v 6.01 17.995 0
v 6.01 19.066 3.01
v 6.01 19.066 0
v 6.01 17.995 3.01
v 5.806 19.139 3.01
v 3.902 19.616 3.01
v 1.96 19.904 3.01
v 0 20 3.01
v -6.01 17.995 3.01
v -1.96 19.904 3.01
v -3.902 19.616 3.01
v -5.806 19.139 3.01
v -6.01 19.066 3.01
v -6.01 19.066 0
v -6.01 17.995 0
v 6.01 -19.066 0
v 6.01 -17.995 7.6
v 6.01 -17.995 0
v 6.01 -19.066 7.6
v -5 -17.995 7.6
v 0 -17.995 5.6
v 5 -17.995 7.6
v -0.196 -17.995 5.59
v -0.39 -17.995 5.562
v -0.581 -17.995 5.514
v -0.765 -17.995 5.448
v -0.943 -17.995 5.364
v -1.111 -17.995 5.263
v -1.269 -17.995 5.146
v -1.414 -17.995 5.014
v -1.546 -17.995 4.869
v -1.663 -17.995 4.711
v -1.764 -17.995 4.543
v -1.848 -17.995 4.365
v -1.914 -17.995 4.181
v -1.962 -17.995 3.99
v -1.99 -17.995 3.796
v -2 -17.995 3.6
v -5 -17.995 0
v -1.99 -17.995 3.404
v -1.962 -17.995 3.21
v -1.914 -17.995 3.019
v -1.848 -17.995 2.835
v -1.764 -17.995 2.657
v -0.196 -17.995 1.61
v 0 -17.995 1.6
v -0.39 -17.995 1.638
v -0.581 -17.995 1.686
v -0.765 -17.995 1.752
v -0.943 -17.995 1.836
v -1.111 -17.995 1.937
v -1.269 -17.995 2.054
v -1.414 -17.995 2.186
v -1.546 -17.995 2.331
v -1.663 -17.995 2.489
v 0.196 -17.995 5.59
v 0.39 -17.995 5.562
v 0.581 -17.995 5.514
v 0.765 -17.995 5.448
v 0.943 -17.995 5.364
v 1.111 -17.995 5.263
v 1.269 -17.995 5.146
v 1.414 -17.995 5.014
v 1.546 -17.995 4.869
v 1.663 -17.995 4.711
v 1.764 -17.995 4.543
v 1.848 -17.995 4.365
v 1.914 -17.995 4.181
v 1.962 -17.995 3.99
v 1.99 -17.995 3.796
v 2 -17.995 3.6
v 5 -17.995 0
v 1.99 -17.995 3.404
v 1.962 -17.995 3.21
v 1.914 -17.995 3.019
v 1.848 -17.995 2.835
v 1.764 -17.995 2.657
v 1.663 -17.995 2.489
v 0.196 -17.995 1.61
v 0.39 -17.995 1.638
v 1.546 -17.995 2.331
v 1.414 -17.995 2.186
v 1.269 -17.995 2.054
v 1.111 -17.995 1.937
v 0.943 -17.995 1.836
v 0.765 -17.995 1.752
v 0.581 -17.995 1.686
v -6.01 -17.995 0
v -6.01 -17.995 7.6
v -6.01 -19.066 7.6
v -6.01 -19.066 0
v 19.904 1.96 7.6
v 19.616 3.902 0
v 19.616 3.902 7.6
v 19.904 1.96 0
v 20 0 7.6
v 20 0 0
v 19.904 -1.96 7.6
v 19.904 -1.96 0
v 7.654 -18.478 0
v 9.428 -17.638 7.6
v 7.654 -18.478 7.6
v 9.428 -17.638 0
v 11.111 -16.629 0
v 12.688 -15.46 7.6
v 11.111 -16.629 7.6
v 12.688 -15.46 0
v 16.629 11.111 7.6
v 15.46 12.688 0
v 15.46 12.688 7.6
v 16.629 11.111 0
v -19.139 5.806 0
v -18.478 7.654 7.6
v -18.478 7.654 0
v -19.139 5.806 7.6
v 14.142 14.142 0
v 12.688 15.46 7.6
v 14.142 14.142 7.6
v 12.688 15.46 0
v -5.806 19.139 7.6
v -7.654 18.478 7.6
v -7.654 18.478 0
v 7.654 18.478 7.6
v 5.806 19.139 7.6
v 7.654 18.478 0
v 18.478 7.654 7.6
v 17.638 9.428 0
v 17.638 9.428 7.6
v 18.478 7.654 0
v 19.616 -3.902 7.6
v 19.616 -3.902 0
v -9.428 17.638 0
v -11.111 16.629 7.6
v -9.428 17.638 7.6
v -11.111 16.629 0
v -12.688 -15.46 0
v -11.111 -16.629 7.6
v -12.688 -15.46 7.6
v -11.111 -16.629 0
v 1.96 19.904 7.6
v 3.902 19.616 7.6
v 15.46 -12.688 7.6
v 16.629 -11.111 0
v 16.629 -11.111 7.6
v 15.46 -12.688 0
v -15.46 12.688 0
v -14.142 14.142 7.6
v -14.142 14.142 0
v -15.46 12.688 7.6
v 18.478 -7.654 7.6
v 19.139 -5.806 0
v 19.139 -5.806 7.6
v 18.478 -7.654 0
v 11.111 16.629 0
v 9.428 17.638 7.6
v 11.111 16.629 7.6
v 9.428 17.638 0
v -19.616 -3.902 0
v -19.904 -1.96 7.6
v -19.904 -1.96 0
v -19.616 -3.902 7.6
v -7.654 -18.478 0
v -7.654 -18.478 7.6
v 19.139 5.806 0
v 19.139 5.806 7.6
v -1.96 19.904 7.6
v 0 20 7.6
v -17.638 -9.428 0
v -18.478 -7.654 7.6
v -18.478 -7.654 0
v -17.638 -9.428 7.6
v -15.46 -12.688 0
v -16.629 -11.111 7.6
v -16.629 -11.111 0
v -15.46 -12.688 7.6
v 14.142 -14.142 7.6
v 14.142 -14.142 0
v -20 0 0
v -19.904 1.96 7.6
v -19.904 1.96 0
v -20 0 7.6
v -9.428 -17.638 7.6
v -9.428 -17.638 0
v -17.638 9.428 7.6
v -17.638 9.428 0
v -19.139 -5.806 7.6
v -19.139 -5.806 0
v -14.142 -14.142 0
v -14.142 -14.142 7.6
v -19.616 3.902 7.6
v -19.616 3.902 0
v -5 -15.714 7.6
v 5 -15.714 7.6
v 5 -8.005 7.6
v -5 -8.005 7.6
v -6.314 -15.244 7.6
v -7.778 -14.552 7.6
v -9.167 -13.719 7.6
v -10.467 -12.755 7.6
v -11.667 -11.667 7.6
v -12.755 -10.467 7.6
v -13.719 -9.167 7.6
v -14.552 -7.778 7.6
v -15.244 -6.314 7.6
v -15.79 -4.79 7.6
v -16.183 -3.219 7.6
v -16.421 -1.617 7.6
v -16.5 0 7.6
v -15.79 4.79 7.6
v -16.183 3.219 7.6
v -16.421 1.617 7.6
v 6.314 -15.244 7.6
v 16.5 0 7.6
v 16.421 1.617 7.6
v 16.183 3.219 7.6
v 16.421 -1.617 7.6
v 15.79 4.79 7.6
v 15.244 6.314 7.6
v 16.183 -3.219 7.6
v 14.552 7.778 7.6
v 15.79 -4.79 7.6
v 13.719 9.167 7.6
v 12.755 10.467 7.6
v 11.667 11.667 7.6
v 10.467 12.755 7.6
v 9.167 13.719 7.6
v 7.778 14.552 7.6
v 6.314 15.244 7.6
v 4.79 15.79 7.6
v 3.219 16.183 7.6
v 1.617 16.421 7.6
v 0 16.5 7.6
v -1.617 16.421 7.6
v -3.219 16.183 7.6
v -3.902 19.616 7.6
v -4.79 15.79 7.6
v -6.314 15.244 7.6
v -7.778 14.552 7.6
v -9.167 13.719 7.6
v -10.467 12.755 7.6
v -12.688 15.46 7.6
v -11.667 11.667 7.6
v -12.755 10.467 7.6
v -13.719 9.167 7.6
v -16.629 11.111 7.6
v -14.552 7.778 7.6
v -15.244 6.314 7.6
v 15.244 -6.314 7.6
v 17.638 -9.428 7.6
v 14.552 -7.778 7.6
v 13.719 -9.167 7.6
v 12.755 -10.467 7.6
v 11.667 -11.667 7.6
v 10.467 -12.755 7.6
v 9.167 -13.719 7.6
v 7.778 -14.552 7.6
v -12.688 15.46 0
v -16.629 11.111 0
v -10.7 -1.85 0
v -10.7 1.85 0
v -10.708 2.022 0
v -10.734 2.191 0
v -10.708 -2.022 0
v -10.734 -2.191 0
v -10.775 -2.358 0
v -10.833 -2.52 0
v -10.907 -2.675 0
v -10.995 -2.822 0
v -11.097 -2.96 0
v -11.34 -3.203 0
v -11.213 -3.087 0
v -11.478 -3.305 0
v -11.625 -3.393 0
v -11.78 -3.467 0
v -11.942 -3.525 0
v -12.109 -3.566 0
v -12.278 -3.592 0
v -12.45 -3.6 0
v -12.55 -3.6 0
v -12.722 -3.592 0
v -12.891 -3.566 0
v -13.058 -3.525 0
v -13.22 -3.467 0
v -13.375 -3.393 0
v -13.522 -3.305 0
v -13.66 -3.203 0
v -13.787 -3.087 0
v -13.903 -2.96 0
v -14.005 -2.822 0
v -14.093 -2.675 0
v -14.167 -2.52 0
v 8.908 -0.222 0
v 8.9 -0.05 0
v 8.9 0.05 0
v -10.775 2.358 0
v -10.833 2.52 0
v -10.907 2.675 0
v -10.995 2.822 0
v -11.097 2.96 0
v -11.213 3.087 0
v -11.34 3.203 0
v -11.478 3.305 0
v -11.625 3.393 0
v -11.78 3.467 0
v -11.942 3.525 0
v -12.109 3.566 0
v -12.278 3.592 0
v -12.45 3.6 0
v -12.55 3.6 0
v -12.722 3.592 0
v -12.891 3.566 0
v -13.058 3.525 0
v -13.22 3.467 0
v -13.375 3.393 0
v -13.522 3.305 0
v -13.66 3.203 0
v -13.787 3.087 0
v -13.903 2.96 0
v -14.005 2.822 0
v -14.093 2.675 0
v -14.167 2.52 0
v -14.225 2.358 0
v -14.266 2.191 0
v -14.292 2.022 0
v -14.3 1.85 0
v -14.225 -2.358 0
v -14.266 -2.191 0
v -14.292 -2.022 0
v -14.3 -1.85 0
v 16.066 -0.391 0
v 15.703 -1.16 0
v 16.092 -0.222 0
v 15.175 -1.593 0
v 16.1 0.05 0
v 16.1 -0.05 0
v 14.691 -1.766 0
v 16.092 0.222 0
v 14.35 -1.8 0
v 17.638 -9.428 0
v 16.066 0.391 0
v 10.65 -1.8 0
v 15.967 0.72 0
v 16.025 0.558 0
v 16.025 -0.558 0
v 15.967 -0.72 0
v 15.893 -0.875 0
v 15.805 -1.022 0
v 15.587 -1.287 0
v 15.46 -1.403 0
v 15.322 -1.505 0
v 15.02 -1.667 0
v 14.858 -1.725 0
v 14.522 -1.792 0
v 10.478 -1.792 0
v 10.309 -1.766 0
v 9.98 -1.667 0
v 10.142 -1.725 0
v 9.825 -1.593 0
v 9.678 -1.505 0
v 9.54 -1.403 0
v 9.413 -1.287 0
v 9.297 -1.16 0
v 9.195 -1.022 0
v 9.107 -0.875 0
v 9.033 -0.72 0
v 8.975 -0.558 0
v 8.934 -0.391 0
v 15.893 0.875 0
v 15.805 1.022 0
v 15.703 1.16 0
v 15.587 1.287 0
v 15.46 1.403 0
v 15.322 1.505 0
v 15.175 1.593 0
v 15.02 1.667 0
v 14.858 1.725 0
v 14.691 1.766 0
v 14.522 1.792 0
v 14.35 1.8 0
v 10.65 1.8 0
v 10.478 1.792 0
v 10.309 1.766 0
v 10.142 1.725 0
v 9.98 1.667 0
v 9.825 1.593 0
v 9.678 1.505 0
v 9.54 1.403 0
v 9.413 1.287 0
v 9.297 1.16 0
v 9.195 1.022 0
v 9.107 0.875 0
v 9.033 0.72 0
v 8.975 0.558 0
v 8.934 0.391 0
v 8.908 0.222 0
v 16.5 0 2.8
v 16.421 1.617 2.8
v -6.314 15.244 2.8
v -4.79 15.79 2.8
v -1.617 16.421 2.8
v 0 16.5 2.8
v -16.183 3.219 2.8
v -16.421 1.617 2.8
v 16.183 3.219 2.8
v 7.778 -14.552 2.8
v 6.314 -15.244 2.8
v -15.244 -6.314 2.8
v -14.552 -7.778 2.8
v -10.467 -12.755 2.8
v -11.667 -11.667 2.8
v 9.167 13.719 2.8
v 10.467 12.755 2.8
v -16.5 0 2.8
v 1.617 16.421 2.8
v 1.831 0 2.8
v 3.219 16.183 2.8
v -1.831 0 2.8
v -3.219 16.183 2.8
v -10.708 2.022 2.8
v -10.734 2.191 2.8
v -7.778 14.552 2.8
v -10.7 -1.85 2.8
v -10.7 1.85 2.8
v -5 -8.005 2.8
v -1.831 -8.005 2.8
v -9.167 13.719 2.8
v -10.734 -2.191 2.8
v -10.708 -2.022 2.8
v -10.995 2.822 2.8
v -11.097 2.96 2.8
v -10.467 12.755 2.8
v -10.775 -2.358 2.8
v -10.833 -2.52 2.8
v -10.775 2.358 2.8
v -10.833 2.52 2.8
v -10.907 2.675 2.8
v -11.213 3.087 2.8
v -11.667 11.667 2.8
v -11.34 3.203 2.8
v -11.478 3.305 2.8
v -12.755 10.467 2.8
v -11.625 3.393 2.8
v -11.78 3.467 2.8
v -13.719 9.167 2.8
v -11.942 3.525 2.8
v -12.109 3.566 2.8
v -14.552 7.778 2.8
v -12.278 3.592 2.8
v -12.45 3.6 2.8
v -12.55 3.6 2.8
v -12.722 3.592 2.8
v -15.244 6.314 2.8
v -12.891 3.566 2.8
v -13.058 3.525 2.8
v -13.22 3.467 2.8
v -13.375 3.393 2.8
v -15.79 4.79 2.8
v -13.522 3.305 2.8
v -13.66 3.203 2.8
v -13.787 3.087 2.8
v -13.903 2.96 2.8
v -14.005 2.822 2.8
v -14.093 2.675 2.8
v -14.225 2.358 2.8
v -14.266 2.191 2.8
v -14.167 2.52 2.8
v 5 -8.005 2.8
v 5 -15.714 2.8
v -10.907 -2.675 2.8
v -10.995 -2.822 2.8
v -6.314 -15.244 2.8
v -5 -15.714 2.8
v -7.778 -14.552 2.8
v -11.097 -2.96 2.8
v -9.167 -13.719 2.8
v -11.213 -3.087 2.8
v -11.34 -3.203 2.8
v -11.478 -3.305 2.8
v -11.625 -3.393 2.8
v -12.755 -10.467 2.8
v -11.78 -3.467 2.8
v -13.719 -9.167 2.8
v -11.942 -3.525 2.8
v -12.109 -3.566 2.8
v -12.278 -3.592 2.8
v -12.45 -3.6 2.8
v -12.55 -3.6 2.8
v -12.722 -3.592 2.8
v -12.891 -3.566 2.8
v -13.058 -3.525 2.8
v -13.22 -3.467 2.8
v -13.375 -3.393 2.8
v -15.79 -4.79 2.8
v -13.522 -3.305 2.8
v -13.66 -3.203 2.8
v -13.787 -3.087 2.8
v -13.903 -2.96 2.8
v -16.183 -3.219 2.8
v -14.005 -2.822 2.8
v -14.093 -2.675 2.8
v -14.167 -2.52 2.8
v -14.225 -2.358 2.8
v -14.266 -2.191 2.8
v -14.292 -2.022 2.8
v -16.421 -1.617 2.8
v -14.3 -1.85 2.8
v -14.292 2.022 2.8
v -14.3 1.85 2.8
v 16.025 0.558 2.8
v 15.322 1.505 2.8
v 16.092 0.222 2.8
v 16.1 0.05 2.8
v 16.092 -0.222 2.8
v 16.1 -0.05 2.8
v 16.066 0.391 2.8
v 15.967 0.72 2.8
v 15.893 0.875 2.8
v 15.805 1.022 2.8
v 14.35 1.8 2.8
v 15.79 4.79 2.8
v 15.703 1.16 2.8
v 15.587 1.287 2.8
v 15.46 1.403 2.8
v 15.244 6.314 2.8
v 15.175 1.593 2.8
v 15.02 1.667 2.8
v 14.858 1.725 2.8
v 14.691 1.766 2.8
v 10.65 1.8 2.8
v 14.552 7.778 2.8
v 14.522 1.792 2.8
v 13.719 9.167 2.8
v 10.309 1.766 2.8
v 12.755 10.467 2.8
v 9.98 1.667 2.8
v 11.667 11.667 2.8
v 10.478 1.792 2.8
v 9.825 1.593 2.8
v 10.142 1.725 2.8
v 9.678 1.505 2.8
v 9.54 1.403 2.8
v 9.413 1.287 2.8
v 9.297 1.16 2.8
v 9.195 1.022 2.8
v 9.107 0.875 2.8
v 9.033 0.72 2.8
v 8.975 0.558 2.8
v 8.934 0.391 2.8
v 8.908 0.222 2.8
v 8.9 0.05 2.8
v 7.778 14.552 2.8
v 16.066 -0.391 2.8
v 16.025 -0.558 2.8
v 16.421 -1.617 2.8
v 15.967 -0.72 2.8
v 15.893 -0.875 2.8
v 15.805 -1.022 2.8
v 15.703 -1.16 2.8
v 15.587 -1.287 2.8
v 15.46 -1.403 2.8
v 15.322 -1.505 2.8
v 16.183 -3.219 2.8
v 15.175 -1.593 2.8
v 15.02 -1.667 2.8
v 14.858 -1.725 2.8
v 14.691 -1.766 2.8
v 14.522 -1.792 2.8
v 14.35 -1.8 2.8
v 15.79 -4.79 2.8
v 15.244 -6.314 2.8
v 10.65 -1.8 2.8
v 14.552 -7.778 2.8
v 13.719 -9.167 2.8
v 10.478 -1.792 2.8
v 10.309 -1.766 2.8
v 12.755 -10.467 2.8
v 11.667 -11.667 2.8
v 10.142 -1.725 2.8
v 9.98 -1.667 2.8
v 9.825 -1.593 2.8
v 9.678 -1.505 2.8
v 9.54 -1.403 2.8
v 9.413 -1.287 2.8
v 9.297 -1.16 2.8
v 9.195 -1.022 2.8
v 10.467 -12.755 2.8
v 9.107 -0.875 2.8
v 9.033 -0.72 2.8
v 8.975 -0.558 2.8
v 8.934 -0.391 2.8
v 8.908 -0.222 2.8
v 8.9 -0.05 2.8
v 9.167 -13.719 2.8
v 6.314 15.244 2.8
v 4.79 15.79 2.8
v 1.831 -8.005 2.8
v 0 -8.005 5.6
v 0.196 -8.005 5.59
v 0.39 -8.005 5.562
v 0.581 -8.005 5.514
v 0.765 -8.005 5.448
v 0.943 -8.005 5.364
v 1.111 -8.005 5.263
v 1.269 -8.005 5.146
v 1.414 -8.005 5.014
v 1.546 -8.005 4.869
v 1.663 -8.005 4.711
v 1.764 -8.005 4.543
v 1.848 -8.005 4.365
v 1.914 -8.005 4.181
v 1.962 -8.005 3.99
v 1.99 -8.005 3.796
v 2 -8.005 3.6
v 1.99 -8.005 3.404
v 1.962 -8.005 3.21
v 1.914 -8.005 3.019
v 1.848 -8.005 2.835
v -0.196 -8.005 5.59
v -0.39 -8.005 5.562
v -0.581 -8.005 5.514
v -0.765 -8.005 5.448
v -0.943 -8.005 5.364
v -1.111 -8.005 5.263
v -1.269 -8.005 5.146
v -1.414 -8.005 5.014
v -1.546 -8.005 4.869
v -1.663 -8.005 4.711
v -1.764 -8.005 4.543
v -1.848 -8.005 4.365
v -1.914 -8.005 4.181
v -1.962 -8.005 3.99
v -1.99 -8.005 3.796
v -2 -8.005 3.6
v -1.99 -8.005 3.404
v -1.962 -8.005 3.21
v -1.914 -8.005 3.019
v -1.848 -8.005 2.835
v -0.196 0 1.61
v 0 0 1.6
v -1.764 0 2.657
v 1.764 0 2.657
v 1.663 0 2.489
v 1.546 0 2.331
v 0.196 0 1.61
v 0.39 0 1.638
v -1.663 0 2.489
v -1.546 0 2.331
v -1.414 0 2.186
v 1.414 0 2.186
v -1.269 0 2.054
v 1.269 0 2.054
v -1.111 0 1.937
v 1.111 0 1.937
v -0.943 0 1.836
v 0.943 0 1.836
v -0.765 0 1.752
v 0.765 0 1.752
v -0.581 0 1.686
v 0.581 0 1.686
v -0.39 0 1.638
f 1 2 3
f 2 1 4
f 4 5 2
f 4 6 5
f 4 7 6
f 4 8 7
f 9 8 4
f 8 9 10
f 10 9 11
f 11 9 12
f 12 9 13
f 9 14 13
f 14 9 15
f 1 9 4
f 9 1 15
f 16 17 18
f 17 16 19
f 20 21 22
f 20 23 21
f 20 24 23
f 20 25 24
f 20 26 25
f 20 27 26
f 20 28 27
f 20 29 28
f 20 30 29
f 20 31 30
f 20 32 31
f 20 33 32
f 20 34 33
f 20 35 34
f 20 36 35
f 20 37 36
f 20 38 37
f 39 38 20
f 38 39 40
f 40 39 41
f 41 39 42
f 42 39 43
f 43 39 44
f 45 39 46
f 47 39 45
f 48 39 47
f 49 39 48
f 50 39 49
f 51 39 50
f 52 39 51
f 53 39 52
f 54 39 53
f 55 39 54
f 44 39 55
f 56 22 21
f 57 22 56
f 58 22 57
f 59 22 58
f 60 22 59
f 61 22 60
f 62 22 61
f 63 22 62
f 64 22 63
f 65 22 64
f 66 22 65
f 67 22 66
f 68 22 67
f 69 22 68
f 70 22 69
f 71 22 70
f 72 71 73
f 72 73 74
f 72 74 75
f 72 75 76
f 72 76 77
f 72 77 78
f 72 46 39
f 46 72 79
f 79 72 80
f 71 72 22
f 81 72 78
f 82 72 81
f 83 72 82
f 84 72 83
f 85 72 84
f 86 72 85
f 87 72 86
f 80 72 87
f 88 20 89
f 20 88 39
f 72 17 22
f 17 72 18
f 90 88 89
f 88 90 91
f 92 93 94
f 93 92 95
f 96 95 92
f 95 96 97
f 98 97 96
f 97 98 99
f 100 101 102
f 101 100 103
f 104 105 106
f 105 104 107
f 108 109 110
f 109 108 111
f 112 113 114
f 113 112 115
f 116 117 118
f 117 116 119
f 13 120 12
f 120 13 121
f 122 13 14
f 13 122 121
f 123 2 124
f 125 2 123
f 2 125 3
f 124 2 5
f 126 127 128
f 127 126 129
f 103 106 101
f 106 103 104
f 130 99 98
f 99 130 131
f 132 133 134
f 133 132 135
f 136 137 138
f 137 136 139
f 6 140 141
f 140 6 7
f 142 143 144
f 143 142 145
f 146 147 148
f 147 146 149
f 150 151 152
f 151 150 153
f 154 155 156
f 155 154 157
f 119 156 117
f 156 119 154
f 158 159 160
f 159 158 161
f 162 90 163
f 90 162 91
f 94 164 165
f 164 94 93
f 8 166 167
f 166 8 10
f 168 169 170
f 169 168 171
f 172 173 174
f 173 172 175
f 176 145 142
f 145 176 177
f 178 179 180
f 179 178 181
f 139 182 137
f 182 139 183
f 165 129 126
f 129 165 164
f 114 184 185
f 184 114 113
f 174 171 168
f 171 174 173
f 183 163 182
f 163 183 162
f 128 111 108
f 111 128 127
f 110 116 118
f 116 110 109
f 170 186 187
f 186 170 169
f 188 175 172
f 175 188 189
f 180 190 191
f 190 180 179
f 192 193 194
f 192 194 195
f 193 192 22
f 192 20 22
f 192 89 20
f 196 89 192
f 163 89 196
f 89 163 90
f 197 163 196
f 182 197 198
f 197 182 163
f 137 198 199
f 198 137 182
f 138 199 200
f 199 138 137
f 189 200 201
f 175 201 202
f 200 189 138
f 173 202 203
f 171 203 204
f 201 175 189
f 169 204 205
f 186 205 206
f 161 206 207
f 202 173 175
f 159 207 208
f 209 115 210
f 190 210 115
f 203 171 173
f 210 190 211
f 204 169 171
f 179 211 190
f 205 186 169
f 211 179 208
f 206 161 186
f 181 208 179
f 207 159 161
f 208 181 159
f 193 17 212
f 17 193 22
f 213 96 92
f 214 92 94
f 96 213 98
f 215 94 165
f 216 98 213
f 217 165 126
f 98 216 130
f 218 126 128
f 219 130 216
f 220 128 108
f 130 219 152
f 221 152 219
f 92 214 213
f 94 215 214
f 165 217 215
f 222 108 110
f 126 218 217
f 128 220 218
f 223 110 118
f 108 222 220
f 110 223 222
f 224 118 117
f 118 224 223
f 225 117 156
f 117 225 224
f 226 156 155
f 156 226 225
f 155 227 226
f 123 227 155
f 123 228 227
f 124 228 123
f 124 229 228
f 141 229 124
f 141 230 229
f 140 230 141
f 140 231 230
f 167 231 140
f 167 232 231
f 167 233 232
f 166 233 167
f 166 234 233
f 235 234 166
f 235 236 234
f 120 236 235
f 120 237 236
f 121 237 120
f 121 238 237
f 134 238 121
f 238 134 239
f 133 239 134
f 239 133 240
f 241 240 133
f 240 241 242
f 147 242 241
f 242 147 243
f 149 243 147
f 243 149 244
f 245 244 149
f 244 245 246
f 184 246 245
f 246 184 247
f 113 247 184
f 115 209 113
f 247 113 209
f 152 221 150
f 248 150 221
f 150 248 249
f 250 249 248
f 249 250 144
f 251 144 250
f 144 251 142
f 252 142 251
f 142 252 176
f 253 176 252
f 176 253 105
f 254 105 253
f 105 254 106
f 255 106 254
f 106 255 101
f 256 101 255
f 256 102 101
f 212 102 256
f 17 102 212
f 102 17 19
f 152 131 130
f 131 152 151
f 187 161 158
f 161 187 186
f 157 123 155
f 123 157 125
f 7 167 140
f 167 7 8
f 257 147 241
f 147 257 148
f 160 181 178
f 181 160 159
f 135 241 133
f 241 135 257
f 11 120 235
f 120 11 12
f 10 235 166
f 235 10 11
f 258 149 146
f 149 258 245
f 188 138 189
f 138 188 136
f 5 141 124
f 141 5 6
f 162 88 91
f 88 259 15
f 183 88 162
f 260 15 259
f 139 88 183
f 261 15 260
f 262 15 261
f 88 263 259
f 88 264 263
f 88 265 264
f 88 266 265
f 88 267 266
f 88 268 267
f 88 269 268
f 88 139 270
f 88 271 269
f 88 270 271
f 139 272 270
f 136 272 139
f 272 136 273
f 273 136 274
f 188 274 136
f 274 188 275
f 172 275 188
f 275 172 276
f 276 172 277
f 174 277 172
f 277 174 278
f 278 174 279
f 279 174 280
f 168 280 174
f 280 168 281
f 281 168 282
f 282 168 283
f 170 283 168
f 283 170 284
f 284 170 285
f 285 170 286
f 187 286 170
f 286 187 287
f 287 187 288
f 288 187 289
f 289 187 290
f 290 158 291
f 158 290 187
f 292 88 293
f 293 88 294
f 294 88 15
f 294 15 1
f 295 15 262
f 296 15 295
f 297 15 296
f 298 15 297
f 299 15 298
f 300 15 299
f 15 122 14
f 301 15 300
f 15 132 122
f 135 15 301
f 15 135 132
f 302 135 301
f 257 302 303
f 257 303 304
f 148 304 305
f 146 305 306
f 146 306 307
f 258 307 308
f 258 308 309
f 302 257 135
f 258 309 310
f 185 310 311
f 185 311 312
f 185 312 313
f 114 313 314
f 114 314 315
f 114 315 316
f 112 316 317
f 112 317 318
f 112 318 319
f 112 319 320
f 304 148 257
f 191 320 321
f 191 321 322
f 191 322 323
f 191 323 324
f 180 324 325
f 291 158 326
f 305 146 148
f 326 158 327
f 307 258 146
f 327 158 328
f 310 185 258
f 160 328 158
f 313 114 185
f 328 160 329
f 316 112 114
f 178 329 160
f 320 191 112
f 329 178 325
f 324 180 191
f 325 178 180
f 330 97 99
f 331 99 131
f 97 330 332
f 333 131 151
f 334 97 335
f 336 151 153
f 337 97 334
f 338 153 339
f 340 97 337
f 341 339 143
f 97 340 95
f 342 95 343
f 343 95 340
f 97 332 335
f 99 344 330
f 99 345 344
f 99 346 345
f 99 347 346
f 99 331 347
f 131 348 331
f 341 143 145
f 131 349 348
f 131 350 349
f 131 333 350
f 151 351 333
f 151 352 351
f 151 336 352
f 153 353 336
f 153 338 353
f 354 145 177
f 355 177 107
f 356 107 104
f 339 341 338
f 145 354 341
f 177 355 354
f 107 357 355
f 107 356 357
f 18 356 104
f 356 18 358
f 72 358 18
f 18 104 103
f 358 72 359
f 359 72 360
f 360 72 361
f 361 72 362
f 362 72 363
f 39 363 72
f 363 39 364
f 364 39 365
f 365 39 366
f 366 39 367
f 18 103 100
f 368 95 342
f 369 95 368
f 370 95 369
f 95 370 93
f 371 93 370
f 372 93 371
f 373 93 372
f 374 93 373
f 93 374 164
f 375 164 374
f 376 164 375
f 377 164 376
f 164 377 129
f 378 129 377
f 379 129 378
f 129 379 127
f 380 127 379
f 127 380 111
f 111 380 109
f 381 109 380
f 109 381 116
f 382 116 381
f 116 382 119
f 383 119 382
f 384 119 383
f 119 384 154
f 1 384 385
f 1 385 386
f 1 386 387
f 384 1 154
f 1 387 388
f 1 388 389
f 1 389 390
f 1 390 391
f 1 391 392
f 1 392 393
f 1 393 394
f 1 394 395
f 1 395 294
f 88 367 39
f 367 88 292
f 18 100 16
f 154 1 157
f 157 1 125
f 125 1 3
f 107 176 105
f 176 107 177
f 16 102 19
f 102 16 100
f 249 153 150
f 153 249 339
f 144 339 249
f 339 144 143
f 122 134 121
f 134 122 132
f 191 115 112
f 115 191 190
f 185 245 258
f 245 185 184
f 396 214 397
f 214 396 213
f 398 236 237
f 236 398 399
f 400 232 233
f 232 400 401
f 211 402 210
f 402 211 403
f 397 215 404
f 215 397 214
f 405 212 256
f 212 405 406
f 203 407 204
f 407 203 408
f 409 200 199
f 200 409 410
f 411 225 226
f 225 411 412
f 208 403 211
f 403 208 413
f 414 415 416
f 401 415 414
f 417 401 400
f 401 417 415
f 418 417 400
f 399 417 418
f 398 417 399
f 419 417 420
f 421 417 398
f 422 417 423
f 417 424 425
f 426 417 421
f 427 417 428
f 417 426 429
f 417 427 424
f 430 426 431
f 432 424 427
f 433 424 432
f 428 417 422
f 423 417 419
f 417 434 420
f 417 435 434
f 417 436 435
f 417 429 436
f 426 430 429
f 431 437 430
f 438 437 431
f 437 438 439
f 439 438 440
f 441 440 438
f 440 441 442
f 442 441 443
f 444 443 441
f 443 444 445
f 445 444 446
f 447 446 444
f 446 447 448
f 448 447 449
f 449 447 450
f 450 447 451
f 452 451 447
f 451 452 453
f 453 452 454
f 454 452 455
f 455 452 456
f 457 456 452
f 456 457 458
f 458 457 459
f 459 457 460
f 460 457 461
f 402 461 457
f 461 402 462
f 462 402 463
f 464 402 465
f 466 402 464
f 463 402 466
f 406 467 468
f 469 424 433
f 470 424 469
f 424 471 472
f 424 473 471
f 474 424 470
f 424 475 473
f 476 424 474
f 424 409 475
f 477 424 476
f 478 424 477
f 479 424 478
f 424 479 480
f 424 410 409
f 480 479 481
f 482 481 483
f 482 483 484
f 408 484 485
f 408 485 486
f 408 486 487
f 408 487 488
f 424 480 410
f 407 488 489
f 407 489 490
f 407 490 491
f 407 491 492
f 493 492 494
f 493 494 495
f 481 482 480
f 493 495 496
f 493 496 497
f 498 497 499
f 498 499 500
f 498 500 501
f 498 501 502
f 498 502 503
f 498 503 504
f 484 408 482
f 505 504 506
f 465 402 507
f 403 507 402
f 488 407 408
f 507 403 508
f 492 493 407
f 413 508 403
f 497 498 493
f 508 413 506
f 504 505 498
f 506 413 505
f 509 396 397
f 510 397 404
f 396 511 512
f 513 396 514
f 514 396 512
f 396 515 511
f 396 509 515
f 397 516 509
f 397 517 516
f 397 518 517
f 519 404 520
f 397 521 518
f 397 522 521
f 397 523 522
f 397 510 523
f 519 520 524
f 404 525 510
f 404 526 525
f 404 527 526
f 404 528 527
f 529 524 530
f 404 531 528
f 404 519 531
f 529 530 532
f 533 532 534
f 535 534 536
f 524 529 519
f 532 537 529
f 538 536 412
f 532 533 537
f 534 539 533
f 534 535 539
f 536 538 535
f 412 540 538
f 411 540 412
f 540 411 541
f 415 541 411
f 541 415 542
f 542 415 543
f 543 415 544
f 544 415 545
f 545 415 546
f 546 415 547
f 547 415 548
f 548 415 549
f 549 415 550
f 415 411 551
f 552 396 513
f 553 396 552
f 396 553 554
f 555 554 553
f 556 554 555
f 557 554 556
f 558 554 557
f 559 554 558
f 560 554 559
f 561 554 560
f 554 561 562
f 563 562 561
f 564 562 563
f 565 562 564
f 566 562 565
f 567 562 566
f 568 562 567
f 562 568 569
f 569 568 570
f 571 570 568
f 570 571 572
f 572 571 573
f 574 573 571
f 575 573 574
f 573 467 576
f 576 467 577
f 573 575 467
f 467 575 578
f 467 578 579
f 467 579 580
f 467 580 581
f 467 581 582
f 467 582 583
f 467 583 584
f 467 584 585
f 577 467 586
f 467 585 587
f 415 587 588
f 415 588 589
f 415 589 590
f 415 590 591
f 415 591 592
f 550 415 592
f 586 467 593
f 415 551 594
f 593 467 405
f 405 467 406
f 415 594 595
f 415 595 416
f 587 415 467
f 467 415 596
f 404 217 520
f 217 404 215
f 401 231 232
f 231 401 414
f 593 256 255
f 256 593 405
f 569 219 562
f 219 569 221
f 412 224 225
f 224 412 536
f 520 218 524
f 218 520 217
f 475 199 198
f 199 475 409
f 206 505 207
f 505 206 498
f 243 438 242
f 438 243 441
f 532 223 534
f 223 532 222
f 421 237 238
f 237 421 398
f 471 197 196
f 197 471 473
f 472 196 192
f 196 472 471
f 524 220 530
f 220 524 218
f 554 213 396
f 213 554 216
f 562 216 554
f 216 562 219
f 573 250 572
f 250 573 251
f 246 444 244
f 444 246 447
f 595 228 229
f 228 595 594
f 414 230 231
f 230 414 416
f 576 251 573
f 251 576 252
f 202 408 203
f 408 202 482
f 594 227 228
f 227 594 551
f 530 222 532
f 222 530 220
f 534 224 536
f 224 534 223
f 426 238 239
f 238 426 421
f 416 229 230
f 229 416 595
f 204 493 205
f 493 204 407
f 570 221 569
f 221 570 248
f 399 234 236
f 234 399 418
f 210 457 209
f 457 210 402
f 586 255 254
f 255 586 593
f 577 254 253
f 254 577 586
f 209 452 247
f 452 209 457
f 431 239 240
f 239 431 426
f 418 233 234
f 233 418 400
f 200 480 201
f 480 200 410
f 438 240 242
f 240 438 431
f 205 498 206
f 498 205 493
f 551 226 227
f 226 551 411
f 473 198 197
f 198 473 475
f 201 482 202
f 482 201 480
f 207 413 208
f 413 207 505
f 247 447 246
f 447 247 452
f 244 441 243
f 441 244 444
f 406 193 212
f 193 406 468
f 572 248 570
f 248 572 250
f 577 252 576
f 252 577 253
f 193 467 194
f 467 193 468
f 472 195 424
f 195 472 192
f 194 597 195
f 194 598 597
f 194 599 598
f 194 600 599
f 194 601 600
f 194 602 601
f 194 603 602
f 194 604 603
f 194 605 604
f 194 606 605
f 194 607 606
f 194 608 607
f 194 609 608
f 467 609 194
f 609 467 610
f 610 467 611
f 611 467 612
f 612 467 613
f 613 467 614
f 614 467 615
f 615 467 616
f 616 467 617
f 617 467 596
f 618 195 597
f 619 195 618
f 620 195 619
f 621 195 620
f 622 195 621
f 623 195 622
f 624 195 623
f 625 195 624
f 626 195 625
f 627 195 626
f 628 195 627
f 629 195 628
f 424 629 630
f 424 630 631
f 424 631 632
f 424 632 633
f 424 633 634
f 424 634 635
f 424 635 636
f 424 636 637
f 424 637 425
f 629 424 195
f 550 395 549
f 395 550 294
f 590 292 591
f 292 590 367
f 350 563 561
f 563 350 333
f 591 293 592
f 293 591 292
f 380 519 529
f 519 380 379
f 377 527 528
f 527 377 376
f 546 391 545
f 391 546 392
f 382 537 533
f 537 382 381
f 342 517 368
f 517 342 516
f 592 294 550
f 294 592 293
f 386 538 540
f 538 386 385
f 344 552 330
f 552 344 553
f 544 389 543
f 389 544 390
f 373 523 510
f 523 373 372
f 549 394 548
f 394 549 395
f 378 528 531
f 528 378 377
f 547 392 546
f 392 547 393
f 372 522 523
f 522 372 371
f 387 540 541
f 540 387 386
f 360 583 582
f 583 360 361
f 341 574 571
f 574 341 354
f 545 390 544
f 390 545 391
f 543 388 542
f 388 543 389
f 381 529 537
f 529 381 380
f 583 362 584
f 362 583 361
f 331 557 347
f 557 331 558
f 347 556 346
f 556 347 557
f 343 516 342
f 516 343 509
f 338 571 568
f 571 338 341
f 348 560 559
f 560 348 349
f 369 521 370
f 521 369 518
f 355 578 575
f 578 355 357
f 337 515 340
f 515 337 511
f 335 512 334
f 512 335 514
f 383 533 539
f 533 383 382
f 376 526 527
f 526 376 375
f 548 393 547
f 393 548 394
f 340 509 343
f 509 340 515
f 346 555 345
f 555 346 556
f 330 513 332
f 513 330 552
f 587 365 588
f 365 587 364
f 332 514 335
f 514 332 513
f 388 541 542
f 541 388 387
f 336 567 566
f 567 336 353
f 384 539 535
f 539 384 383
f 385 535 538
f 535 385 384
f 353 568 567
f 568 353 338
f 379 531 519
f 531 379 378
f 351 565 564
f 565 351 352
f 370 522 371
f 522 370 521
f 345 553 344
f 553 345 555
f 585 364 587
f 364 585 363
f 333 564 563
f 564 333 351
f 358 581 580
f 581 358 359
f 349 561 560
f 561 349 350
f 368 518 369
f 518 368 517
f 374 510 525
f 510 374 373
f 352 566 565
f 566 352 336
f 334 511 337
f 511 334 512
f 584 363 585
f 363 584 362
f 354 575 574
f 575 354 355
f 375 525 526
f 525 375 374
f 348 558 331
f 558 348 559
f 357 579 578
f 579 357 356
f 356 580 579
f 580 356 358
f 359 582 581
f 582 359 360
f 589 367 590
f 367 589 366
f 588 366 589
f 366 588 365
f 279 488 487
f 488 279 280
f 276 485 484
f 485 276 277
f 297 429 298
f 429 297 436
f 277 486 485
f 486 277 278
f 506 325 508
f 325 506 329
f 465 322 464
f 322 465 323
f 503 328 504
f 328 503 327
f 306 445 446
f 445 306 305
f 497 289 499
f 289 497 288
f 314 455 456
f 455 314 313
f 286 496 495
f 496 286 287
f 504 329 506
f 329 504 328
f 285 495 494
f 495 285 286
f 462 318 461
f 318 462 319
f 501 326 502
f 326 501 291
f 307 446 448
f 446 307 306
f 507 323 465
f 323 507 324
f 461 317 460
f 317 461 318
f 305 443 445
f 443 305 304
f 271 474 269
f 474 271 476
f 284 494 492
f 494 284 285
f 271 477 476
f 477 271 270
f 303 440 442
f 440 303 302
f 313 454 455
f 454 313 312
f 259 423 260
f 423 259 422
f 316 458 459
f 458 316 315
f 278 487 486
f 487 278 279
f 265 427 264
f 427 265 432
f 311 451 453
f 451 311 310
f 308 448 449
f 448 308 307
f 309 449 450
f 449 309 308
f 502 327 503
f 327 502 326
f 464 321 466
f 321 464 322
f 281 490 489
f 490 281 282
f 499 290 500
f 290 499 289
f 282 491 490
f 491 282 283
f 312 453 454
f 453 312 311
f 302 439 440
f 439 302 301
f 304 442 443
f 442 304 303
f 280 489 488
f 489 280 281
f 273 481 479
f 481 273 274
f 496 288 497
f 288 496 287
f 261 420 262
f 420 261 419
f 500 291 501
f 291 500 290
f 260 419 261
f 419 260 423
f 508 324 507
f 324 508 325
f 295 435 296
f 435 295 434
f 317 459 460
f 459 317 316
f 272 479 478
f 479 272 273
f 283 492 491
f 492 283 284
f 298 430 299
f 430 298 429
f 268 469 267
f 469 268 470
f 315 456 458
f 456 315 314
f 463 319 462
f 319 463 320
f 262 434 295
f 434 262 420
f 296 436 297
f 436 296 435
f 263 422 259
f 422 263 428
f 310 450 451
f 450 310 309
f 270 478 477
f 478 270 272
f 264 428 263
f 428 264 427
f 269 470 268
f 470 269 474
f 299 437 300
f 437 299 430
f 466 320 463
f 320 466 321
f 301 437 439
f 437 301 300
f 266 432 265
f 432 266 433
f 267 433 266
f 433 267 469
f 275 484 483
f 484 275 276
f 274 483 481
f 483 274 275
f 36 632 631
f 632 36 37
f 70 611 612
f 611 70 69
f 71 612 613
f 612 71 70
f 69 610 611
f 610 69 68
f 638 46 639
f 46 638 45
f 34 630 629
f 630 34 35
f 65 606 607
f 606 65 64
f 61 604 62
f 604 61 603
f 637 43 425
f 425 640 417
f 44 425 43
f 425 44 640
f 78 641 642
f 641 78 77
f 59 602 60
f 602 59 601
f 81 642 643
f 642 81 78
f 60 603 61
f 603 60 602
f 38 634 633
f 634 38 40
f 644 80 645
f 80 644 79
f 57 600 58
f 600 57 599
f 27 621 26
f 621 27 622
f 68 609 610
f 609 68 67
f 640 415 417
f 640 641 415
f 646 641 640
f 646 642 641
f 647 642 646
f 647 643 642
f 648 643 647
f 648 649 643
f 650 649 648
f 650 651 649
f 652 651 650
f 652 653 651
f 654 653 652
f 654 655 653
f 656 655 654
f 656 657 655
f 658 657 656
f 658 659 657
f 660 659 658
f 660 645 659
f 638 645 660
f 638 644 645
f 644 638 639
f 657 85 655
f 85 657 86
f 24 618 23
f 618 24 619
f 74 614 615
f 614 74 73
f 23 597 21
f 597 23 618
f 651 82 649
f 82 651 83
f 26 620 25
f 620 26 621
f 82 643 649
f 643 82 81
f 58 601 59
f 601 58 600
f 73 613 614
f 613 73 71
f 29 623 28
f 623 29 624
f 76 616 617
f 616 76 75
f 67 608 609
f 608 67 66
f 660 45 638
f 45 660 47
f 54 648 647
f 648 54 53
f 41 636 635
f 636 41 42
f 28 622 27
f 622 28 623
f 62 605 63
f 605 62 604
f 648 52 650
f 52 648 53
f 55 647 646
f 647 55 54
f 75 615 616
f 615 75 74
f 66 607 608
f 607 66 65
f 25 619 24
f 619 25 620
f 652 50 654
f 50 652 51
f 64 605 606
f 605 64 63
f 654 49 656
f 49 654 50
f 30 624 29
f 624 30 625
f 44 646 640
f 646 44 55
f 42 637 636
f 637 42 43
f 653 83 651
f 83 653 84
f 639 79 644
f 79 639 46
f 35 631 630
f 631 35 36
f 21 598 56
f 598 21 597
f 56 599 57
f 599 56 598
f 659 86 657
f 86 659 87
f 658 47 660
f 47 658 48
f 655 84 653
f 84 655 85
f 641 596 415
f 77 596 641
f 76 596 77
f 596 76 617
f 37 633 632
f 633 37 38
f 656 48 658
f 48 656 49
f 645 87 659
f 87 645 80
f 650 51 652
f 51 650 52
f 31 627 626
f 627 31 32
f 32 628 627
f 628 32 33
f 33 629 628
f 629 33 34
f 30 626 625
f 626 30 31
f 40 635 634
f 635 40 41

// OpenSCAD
// file: bathroomHolderCircle/tab_perpendicular_peg_cutout.scad
// Radial cylinder through tab-recess rim (axis ⊥ XZ back wall of tab_recess_pocket).
// Geometry parameters match the tab pocket on the outer wall (see tab_recess_cutout.scad).

module tab_perpendicular_peg_cutout() {
    base_outer_r = 40 / 2;
    tab_recess_depth = 2;
    tab_perpendicular_peg_d = 4;
    tab_perpendicular_peg_z = 2 + 1.6;
    tab_perpendicular_peg_length = 18;
    y_offset = 10;

    y_center = -1 * (base_outer_r - tab_recess_depth / 2);
    translate([0, y_center + y_offset, tab_perpendicular_peg_z])
        rotate([90, 0, 0])
            cylinder(h = tab_perpendicular_peg_length, d = tab_perpendicular_peg_d, center = true);
}
// file: bathroomHolderCircle/tab_recess_cutout.scad
// "Вырез под выступ": symmetric pockets on the outer wall at +Y and −Y (perpendicular to the pin line on ±X).
// Tangent width 12 mm, radial depth 2 mm; axial extent for each pocket is set separately (from z = 0 upward).

base_outer_r = 40 / 2;
tab_recess_width = 12;
tab_recess_depth = 2;
base_height = 6.6;

// Axial height (mm) of each pocket from z = 0; set independently for +Y and −Y sides.
tab_recess_z_plus_y = 6.6 - 3.6;
tab_recess_z_minus_y = 7.6;

// Single pocket: yaw_deg = 0 → +Y rim; yaw_deg = 180 → −Y rim.
module tab_recess_pocket(z_height, yaw_deg) {
    eps = 0.01;
    rotate([0, 0, yaw_deg])
        translate([0, base_outer_r - tab_recess_depth / 2 + eps / 2, z_height / 2])
            cube([tab_recess_width + 2 * eps, tab_recess_depth + 2 * eps, z_height + 2 * eps], center = true);
}

module tab_recess_cutout() {
    tab_recess_pocket(tab_recess_z_plus_y, 0);
    tab_recess_pocket(tab_recess_z_minus_y, 180);
}
// file: bathroomHolderCircle/pin_cutouts.scad
// Pin holes: rounded-rectangle profile in plan (flat sides, arcs only in corners — not ellipse-like).
// Axis along Z (normal to the flat lid). Centers symmetric on ±X at pin_offset_from_axis.

pin_plan_w = 7.2;
pin_plan_h = 3.6;
// Corner radius: must be < min(w,h)/2 (here h/2 = 1.8) so a thin flat remains on the short sides.
pin_corner_r = 1.75;
pin_height = 4;

// Half-distance from Z-axis to each pin center (pair is symmetric through origin).
pin_offset_from_axis = 12.5;

// 2D rounded rectangle centered at origin (w ≥ h after rotation at call site).
module rounded_rect_2d(w, h, r) {
    iw = w / 2 - r;
    ih = h / 2 - r;
    hull() {
        translate([iw, ih])
            circle(r = r);
        translate([-iw, ih])
            circle(r = r);
        translate([iw, -ih])
            circle(r = r);
        translate([-iw, -ih])
            circle(r = r);
    }
}

// Extruded rounded rect; rotation_z_deg swaps long/short axis in plan (horizontal vs vertical).
module rounded_rect_pin_cutout(rotation_z_deg) {
    rotate([0, 0, rotation_z_deg])
        linear_extrude(height = pin_height, center = false)
            rounded_rect_2d(pin_plan_w, pin_plan_h, pin_corner_r);
}

module pin_cutouts() {
    translate([0, 0, -1]) {
        translate([pin_offset_from_axis, 0, 0])
            rounded_rect_pin_cutout(0);
        translate([-pin_offset_from_axis, 0, 0])
            rounded_rect_pin_cutout(90);
    }
}
// file: bathroomHolderCircle/cutout_cylinder.scad
// Cutout cylinder: Ø33 mm. Height = (base height 6.6 − bottom wall 1.8) + 1 mm past the
// top face so the boolean is not coplanar with the lid. Same XY center as base_cylinder().
module cutout_cylinder() {
    translate([0, 0, 2.8])
        cylinder(h = 5.8, d = 33, center = false);
}
// file: bathroomHolderCircle/base_cylinder.scad
// Base cylinder for bathroom holder (circle variant): Ø40 mm, height 6.6 mm.
// Bottom on Z=0, extends along +Z.
module base_cylinder() {
    color([0.55, 0.33, 0.2])
        cylinder(h = 7.6, d = 40, center = false);     
}
// main file
include <bathroomHolderCircle/base_cylinder.scad>
include <bathroomHolderCircle/cutout_cylinder.scad>
include <bathroomHolderCircle/pin_cutouts.scad>
include <bathroomHolderCircle/tab_recess_cutout.scad>
include <bathroomHolderCircle/tab_perpendicular_peg_cutout.scad>

$fn = 64; // more then enought to print on BambuLab A1 mini

difference() {
    union() {
        difference() {
            base_cylinder();
            cutout_cylinder();
            tab_recess_cutout();
        }
        color([0.15, 0.23, 0.4])
            translate([0, -13, 3.8])
                cube([10, 10-0.01, 7.6], center = true);
    }
    pin_cutouts();
    tab_perpendicular_peg_cutout();
}
